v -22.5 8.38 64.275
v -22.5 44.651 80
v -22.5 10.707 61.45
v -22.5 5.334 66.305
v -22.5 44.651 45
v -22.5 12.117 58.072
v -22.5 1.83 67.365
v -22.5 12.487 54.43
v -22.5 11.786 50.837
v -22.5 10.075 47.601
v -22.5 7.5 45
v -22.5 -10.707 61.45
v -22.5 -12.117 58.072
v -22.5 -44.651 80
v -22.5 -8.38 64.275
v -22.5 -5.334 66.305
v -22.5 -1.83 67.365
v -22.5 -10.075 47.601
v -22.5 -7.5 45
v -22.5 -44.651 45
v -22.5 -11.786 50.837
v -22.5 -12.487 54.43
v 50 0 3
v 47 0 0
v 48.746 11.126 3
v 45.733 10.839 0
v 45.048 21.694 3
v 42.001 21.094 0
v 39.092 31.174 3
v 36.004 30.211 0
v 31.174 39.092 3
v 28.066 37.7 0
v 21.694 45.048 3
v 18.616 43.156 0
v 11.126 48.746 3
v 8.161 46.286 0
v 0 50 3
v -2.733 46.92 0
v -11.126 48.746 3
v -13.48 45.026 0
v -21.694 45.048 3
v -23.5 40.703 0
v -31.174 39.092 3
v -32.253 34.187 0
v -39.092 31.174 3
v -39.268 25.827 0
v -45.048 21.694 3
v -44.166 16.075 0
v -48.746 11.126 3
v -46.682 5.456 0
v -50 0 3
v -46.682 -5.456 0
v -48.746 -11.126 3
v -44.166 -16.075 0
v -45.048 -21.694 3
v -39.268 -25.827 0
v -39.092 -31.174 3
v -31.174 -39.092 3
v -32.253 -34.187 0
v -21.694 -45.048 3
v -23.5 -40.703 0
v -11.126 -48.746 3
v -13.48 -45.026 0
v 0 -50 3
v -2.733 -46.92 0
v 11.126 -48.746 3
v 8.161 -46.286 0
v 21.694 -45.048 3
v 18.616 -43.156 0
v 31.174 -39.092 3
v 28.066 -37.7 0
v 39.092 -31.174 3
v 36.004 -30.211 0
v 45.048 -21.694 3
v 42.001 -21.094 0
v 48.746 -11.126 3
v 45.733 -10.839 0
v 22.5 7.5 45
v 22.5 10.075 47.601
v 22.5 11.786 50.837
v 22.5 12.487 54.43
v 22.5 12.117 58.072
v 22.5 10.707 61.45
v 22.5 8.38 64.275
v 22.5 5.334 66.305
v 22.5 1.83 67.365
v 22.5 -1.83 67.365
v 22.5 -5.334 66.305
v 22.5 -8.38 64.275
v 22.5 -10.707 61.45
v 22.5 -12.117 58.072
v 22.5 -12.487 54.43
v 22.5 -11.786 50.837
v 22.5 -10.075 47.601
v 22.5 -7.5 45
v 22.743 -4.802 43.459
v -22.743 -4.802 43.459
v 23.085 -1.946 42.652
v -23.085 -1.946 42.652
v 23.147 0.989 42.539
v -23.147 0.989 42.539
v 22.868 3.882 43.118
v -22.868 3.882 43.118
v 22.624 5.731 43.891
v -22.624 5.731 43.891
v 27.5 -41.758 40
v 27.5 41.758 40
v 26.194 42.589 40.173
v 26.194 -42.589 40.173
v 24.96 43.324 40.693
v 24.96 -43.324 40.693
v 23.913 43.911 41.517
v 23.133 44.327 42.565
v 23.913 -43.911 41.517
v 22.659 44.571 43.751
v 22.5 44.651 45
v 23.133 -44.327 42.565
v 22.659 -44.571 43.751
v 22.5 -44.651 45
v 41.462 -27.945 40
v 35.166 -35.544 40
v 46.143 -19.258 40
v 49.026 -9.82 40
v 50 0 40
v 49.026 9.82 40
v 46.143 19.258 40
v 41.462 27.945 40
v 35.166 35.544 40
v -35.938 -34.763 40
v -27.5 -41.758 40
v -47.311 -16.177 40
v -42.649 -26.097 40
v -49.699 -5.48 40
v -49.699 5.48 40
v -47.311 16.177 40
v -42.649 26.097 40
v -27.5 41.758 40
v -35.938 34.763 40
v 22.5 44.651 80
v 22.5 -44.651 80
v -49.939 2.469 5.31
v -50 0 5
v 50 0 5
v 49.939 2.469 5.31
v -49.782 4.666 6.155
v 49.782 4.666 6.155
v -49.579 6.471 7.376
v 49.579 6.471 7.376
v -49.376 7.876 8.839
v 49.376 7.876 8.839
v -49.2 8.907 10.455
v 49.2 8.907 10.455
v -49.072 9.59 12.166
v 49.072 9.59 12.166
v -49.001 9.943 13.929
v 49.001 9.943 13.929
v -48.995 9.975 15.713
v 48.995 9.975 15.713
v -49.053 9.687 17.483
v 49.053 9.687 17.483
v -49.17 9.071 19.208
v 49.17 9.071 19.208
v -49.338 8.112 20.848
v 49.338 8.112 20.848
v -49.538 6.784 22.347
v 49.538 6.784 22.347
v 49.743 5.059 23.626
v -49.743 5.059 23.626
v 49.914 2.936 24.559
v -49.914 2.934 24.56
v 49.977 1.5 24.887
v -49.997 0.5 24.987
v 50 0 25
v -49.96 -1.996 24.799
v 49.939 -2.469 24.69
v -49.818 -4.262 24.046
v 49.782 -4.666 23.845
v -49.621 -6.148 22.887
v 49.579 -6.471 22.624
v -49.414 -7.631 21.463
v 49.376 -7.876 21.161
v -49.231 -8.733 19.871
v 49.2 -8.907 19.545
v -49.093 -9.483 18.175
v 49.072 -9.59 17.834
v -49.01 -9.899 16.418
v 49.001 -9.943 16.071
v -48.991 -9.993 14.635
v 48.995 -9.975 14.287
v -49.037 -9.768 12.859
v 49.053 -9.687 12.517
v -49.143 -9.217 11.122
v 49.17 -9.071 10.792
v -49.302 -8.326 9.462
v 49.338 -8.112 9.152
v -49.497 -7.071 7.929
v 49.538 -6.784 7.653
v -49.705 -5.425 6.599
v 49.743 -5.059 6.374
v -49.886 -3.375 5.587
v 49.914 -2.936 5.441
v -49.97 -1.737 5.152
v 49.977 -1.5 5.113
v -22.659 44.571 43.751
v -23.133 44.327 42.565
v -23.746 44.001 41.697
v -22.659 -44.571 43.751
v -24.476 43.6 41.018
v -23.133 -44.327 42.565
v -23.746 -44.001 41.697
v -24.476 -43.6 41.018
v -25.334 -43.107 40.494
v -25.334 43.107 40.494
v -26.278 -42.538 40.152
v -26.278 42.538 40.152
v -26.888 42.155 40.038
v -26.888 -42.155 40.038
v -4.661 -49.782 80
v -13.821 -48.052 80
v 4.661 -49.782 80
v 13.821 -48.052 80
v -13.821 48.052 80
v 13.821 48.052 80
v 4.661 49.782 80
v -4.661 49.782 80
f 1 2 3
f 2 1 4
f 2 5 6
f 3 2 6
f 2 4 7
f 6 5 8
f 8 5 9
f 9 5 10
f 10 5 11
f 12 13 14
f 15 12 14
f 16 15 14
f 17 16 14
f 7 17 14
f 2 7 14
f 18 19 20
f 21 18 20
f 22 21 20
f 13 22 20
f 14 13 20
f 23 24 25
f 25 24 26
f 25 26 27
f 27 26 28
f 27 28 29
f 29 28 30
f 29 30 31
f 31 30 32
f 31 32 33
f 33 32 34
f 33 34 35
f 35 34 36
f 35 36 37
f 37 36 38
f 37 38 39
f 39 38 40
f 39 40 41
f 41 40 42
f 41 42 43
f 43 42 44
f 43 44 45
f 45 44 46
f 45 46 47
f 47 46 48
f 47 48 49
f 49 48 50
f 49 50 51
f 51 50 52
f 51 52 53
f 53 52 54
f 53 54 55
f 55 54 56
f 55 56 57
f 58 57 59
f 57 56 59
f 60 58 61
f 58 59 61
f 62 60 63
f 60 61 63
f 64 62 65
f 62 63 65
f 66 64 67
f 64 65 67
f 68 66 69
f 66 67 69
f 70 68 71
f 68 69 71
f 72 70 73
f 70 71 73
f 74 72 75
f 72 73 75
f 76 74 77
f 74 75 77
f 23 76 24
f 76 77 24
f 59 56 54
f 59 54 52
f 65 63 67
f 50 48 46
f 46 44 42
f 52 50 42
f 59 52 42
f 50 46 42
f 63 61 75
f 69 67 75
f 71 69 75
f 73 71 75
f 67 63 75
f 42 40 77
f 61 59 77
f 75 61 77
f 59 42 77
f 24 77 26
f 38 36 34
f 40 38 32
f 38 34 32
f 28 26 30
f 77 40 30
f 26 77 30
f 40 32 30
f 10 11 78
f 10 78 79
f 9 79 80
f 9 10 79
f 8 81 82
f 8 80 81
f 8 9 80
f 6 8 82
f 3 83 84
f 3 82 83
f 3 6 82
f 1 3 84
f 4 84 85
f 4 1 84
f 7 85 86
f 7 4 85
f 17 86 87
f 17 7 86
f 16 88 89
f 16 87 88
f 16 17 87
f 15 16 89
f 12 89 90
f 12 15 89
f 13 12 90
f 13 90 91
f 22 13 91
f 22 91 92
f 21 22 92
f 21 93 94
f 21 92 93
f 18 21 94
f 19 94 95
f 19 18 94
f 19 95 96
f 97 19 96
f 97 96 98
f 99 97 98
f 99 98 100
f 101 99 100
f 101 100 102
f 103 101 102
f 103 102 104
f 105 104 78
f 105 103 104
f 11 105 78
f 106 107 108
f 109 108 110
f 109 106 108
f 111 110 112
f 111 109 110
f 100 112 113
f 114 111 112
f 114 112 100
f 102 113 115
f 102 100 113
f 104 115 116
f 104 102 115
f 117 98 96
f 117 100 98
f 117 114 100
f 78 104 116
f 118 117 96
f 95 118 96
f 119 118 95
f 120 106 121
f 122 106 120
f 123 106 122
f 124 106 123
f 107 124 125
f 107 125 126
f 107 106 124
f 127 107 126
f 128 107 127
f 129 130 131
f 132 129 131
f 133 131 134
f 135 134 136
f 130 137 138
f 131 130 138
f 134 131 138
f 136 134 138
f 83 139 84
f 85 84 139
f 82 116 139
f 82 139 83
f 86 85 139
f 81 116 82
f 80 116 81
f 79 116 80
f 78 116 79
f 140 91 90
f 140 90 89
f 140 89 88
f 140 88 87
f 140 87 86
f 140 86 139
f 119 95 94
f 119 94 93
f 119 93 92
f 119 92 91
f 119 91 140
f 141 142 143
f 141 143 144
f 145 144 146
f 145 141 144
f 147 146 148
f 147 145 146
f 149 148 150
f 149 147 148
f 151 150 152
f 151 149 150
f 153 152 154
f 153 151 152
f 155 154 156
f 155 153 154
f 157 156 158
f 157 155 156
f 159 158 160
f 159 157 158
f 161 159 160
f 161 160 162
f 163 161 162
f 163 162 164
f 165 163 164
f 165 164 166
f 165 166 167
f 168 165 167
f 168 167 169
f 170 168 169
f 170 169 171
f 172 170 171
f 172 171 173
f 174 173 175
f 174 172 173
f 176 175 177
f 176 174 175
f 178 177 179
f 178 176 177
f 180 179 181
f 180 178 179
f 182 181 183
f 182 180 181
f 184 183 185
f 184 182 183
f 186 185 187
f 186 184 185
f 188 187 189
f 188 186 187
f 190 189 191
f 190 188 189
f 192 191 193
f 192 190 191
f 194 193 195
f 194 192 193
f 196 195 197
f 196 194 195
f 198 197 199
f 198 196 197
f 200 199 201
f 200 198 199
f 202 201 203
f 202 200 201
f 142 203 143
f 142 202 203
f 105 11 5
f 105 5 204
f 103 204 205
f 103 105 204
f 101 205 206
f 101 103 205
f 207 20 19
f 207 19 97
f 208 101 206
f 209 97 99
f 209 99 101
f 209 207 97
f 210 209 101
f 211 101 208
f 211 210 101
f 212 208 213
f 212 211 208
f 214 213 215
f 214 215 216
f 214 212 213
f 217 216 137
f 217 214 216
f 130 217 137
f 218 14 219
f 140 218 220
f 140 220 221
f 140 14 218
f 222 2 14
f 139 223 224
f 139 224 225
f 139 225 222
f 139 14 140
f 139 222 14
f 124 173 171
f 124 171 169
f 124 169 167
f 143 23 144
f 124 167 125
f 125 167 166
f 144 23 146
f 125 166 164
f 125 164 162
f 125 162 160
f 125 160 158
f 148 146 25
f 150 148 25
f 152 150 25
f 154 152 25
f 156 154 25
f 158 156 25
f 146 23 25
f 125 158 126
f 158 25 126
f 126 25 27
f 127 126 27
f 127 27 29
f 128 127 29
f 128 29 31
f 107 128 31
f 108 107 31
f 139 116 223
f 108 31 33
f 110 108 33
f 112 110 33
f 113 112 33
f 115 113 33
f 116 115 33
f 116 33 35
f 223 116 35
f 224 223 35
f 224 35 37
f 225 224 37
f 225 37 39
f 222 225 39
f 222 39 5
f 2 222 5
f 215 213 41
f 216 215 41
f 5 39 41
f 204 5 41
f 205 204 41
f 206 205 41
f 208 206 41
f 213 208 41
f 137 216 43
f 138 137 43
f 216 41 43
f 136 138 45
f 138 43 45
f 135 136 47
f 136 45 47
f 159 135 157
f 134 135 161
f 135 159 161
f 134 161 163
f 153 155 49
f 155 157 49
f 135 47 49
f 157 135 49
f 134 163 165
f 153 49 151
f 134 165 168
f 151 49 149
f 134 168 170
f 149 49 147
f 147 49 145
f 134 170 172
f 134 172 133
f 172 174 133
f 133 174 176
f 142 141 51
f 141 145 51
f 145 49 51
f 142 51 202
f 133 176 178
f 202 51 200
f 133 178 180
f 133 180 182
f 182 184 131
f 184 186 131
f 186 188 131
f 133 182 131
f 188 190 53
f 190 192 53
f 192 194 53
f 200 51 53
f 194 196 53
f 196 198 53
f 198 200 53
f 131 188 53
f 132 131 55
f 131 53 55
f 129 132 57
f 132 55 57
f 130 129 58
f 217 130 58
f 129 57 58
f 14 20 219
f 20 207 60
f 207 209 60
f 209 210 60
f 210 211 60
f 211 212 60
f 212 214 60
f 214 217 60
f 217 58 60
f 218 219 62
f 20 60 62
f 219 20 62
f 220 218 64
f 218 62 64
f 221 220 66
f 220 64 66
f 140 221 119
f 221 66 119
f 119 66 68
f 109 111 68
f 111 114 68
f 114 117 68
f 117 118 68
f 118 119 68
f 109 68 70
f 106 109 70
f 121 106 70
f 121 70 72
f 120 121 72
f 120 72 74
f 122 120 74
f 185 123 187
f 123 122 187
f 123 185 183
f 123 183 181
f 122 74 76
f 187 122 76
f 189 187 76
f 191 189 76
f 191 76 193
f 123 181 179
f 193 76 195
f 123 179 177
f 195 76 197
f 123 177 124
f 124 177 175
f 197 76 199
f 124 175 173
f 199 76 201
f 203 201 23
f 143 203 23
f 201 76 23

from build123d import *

# Parameters (mm, degrees)
SKETCH_1_R               = 50
EXTRUDE_1_DEPTH          = 80
CUT_EXTRUDE_START        = -40
CUT_EXTRUDE_1_DEPTH      = 40
FILLET_1_R               = 5
CUT_EXTRUDE_2_DEPTH      = 107.770782689
CUT_EXTRUDE_2_DEPTH_BACK = 107.770782689
SKETCH_3_R               = 12.5
CHAMFER_1_SIZE           = 3
CUT_EXTRUDE_3_DEPTH      = 107.770782689
CUT_EXTRUDE_3_DEPTH_BACK = 107.770782689
SKETCH_4_R               = 10


with BuildPart() as part:
    # Эскиз1 → Бобышка-Вытянуть1 (new body)
    with BuildSketch(Plane.XY):
        Circle(SKETCH_1_R)
    extrude(amount=EXTRUDE_1_DEPTH)

    # Эскиз2 → Вырез-Вытянуть1 (cut)
    with BuildSketch(Plane.XY.offset(80).offset(CUT_EXTRUDE_START)):
        with BuildLine():
            Line((-22.5, 44.651427749), (-22.5, -44.651427749))
            ThreePointArc((-22.5, -44.651427749), (-50, 0), (-22.5, 44.651427749))
        make_face()
        with BuildLine():
            Line((22.5, 44.651427749), (22.5, -44.651427749))
            ThreePointArc((22.5, -44.651427749), (50, 0), (22.5, 44.651427749))
        make_face()
    extrude(amount=CUT_EXTRUDE_1_DEPTH, mode=Mode.SUBTRACT)

    # Скругление1
    fillet_1_edges = [part.edges().sort_by_distance(p)[0] for p in [
        (22.5, 0, 40),
        (-22.5, 0, 40),
    ]]
    fillet(fillet_1_edges, radius=FILLET_1_R)

    # Эскиз3 → Вырез-Вытянуть2 (cut, two sides: drawn at the far end of the back side and taken through both)
    with BuildSketch(Plane(origin=(0, 0, 0), x_dir=(0, 0, -1), z_dir=(1, 0, 0)).offset(-CUT_EXTRUDE_2_DEPTH_BACK)):
        with Locations(Location((-55, 0, 0), (0, 0, 36.869897646))):
            Circle(SKETCH_3_R)
    extrude(amount=CUT_EXTRUDE_2_DEPTH + CUT_EXTRUDE_2_DEPTH_BACK, mode=Mode.SUBTRACT)

    # Фаска1
    chamfer_1_edges = [part.edges().sort_by_distance(p)[0] for p in [
        (-50, 0, 0),
    ]]
    chamfer(chamfer_1_edges, length=CHAMFER_1_SIZE)

    # Эскиз4 → Вырез-Вытянуть3 (cut, two sides: drawn at the far end of the back side and taken through both)
    with BuildSketch(Plane(origin=(0, 0, 0), x_dir=(0, 0, -1), z_dir=(1, 0, 0)).offset(-CUT_EXTRUDE_3_DEPTH_BACK)):
        with Locations((-15, 0)):
            Circle(SKETCH_4_R)
    extrude(amount=CUT_EXTRUDE_3_DEPTH + CUT_EXTRUDE_3_DEPTH_BACK, mode=Mode.SUBTRACT)


solid = part.part
